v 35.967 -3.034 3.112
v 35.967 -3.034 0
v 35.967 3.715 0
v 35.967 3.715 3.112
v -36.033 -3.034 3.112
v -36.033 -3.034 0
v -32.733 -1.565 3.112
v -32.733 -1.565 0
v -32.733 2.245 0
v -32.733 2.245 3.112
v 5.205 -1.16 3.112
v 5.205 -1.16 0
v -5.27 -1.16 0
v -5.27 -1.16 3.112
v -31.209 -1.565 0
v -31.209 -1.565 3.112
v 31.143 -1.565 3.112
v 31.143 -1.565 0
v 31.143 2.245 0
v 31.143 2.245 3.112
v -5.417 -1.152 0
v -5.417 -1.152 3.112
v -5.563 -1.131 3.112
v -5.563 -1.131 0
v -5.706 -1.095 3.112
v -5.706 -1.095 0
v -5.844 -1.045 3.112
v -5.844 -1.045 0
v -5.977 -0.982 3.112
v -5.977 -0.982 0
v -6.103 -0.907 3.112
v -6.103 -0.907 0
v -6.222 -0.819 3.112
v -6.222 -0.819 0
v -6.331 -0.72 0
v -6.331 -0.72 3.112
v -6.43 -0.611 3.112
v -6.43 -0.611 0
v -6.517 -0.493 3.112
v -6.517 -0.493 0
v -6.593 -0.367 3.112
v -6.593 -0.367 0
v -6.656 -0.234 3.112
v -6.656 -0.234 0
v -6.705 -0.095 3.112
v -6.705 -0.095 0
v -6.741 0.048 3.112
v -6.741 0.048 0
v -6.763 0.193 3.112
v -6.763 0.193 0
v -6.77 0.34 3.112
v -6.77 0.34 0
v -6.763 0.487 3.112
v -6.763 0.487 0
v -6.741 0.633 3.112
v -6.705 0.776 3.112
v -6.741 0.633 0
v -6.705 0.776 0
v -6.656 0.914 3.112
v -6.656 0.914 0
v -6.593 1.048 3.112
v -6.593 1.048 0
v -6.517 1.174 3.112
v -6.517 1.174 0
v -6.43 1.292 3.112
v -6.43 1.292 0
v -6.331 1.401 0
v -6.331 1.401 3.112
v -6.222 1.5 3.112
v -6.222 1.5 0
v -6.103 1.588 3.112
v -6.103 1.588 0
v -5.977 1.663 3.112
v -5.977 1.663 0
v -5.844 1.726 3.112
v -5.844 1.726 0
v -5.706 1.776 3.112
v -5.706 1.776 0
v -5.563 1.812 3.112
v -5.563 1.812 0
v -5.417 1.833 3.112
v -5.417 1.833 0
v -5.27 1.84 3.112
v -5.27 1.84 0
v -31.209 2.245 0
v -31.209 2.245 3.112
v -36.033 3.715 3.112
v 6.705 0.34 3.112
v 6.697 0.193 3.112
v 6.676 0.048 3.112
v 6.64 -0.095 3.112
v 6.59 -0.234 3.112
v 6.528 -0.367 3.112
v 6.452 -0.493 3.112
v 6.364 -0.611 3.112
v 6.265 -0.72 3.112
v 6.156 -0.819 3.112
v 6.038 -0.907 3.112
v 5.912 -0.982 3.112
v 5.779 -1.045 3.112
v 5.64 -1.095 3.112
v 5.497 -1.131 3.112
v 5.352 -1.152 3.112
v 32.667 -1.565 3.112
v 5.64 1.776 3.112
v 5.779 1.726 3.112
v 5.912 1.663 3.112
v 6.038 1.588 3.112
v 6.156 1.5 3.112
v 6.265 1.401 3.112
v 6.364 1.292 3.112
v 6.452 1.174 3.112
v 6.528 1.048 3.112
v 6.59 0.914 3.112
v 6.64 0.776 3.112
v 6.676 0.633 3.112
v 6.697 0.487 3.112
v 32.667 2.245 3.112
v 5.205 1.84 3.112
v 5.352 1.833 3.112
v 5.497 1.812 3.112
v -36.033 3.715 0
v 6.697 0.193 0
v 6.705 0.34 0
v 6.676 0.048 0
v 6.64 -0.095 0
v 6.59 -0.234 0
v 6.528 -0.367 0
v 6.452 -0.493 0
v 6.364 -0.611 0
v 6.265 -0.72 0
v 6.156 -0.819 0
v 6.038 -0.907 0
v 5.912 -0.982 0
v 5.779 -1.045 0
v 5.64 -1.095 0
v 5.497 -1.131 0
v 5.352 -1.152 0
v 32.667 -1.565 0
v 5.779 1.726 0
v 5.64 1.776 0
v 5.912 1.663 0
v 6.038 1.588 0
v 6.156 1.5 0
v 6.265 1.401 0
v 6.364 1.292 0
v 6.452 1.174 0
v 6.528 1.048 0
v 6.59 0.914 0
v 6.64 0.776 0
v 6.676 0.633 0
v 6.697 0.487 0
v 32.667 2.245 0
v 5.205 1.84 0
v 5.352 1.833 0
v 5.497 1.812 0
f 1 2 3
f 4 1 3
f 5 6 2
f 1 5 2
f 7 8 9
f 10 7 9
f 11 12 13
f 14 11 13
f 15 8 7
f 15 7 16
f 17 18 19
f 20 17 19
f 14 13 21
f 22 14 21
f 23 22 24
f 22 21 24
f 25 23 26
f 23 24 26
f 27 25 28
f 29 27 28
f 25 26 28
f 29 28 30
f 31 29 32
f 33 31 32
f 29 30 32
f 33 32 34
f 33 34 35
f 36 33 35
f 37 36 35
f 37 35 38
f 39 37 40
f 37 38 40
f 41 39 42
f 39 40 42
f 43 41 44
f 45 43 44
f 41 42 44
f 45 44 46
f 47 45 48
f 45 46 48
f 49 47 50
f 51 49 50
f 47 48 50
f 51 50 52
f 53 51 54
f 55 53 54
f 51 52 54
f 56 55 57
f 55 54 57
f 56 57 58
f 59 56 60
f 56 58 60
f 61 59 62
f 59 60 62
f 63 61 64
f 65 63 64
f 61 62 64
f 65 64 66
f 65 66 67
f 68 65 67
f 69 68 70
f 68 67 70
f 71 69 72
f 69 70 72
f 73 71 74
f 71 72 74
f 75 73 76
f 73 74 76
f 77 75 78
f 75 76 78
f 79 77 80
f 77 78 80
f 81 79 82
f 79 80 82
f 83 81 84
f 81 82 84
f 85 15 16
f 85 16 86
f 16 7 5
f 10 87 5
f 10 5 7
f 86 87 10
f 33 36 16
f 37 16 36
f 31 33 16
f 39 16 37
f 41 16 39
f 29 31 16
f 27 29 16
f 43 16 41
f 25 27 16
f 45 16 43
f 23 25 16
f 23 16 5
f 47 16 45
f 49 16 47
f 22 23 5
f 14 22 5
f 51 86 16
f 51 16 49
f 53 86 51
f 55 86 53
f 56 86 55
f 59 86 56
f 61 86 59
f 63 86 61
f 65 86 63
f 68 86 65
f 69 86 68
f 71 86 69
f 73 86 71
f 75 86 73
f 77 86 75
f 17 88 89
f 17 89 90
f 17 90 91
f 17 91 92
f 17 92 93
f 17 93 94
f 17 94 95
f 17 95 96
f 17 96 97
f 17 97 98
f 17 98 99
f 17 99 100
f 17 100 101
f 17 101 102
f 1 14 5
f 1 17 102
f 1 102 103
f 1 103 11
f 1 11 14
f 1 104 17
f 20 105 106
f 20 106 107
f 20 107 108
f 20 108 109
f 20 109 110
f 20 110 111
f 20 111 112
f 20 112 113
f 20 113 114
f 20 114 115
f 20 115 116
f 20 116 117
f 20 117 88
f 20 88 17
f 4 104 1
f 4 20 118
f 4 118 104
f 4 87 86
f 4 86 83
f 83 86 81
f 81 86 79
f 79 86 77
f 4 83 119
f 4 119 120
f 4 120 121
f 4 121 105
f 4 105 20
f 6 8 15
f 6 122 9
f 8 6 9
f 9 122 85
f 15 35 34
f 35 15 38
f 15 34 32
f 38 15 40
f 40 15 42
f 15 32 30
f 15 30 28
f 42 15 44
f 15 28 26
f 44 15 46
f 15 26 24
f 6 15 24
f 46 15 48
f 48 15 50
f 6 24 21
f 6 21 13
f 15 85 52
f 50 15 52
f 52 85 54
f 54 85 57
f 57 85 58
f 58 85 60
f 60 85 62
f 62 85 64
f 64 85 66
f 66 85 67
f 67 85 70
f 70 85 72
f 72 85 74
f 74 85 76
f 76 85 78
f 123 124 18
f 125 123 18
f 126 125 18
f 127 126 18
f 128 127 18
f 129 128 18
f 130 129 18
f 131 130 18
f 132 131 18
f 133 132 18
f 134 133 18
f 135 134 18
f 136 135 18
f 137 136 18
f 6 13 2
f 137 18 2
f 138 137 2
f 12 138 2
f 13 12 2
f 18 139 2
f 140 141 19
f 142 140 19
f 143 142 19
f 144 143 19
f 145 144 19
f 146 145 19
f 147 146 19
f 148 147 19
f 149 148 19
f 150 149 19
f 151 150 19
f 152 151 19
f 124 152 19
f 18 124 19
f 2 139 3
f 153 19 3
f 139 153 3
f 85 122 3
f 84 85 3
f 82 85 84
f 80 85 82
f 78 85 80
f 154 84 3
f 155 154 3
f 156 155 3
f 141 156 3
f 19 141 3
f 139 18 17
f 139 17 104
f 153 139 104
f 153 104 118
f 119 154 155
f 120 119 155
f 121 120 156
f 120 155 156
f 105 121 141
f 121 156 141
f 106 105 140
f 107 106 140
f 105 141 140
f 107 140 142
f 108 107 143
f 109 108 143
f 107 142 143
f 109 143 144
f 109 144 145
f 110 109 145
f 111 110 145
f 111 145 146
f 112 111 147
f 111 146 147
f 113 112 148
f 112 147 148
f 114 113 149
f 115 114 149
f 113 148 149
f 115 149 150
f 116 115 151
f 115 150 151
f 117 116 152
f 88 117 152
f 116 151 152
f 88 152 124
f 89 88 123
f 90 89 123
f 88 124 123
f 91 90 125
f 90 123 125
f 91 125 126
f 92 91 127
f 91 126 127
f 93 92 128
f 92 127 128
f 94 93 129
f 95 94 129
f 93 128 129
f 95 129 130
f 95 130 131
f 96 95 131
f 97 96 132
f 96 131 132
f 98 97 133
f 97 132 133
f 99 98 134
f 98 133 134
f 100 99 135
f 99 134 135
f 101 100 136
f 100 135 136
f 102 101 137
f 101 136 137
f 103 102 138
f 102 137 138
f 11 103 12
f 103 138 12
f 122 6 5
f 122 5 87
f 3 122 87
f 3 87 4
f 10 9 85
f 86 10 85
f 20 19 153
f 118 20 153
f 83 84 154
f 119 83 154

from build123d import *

# Parameters (mm, degrees)
SKETCH1_W           = 72
SKETCH1_H           = 6.748944735
SKETCH1_W_2         = 1.524
SKETCH1_H_2         = 3.81
BOSS_EXTRUDE1_DEPTH = 3.1115


with BuildPart() as part:
    # Sketch1 → Boss-Extrude1 (new body)
    with BuildSketch(Plane.XY):
        with Locations((-0.032699801, 0.340407728)):
            Rectangle(SKETCH1_W, SKETCH1_H)
        with Locations((31.905300199, 0.340407728)):
            Rectangle(SKETCH1_W_2, SKETCH1_H_2, mode=Mode.SUBTRACT)
        with Locations((-31.970699801, 0.340407728)):
            Rectangle(SKETCH1_W_2, SKETCH1_H_2, mode=Mode.SUBTRACT)
        with BuildLine():
            Line((-5.27007754, 1.840407728), (5.204677939, 1.840407728))
            ThreePointArc((5.204677939, 1.840407728), (6.704677939, 0.340407728), (5.204677939, -1.159592272))
            Line((5.204677939, -1.159592272), (-5.27007754, -1.159592272))
            ThreePointArc((-5.27007754, -1.159592272), (-6.77007754, 0.340407728), (-5.27007754, 1.840407728))
        make_face(mode=Mode.SUBTRACT)
    extrude(amount=BOSS_EXTRUDE1_DEPTH)


solid = part.part
